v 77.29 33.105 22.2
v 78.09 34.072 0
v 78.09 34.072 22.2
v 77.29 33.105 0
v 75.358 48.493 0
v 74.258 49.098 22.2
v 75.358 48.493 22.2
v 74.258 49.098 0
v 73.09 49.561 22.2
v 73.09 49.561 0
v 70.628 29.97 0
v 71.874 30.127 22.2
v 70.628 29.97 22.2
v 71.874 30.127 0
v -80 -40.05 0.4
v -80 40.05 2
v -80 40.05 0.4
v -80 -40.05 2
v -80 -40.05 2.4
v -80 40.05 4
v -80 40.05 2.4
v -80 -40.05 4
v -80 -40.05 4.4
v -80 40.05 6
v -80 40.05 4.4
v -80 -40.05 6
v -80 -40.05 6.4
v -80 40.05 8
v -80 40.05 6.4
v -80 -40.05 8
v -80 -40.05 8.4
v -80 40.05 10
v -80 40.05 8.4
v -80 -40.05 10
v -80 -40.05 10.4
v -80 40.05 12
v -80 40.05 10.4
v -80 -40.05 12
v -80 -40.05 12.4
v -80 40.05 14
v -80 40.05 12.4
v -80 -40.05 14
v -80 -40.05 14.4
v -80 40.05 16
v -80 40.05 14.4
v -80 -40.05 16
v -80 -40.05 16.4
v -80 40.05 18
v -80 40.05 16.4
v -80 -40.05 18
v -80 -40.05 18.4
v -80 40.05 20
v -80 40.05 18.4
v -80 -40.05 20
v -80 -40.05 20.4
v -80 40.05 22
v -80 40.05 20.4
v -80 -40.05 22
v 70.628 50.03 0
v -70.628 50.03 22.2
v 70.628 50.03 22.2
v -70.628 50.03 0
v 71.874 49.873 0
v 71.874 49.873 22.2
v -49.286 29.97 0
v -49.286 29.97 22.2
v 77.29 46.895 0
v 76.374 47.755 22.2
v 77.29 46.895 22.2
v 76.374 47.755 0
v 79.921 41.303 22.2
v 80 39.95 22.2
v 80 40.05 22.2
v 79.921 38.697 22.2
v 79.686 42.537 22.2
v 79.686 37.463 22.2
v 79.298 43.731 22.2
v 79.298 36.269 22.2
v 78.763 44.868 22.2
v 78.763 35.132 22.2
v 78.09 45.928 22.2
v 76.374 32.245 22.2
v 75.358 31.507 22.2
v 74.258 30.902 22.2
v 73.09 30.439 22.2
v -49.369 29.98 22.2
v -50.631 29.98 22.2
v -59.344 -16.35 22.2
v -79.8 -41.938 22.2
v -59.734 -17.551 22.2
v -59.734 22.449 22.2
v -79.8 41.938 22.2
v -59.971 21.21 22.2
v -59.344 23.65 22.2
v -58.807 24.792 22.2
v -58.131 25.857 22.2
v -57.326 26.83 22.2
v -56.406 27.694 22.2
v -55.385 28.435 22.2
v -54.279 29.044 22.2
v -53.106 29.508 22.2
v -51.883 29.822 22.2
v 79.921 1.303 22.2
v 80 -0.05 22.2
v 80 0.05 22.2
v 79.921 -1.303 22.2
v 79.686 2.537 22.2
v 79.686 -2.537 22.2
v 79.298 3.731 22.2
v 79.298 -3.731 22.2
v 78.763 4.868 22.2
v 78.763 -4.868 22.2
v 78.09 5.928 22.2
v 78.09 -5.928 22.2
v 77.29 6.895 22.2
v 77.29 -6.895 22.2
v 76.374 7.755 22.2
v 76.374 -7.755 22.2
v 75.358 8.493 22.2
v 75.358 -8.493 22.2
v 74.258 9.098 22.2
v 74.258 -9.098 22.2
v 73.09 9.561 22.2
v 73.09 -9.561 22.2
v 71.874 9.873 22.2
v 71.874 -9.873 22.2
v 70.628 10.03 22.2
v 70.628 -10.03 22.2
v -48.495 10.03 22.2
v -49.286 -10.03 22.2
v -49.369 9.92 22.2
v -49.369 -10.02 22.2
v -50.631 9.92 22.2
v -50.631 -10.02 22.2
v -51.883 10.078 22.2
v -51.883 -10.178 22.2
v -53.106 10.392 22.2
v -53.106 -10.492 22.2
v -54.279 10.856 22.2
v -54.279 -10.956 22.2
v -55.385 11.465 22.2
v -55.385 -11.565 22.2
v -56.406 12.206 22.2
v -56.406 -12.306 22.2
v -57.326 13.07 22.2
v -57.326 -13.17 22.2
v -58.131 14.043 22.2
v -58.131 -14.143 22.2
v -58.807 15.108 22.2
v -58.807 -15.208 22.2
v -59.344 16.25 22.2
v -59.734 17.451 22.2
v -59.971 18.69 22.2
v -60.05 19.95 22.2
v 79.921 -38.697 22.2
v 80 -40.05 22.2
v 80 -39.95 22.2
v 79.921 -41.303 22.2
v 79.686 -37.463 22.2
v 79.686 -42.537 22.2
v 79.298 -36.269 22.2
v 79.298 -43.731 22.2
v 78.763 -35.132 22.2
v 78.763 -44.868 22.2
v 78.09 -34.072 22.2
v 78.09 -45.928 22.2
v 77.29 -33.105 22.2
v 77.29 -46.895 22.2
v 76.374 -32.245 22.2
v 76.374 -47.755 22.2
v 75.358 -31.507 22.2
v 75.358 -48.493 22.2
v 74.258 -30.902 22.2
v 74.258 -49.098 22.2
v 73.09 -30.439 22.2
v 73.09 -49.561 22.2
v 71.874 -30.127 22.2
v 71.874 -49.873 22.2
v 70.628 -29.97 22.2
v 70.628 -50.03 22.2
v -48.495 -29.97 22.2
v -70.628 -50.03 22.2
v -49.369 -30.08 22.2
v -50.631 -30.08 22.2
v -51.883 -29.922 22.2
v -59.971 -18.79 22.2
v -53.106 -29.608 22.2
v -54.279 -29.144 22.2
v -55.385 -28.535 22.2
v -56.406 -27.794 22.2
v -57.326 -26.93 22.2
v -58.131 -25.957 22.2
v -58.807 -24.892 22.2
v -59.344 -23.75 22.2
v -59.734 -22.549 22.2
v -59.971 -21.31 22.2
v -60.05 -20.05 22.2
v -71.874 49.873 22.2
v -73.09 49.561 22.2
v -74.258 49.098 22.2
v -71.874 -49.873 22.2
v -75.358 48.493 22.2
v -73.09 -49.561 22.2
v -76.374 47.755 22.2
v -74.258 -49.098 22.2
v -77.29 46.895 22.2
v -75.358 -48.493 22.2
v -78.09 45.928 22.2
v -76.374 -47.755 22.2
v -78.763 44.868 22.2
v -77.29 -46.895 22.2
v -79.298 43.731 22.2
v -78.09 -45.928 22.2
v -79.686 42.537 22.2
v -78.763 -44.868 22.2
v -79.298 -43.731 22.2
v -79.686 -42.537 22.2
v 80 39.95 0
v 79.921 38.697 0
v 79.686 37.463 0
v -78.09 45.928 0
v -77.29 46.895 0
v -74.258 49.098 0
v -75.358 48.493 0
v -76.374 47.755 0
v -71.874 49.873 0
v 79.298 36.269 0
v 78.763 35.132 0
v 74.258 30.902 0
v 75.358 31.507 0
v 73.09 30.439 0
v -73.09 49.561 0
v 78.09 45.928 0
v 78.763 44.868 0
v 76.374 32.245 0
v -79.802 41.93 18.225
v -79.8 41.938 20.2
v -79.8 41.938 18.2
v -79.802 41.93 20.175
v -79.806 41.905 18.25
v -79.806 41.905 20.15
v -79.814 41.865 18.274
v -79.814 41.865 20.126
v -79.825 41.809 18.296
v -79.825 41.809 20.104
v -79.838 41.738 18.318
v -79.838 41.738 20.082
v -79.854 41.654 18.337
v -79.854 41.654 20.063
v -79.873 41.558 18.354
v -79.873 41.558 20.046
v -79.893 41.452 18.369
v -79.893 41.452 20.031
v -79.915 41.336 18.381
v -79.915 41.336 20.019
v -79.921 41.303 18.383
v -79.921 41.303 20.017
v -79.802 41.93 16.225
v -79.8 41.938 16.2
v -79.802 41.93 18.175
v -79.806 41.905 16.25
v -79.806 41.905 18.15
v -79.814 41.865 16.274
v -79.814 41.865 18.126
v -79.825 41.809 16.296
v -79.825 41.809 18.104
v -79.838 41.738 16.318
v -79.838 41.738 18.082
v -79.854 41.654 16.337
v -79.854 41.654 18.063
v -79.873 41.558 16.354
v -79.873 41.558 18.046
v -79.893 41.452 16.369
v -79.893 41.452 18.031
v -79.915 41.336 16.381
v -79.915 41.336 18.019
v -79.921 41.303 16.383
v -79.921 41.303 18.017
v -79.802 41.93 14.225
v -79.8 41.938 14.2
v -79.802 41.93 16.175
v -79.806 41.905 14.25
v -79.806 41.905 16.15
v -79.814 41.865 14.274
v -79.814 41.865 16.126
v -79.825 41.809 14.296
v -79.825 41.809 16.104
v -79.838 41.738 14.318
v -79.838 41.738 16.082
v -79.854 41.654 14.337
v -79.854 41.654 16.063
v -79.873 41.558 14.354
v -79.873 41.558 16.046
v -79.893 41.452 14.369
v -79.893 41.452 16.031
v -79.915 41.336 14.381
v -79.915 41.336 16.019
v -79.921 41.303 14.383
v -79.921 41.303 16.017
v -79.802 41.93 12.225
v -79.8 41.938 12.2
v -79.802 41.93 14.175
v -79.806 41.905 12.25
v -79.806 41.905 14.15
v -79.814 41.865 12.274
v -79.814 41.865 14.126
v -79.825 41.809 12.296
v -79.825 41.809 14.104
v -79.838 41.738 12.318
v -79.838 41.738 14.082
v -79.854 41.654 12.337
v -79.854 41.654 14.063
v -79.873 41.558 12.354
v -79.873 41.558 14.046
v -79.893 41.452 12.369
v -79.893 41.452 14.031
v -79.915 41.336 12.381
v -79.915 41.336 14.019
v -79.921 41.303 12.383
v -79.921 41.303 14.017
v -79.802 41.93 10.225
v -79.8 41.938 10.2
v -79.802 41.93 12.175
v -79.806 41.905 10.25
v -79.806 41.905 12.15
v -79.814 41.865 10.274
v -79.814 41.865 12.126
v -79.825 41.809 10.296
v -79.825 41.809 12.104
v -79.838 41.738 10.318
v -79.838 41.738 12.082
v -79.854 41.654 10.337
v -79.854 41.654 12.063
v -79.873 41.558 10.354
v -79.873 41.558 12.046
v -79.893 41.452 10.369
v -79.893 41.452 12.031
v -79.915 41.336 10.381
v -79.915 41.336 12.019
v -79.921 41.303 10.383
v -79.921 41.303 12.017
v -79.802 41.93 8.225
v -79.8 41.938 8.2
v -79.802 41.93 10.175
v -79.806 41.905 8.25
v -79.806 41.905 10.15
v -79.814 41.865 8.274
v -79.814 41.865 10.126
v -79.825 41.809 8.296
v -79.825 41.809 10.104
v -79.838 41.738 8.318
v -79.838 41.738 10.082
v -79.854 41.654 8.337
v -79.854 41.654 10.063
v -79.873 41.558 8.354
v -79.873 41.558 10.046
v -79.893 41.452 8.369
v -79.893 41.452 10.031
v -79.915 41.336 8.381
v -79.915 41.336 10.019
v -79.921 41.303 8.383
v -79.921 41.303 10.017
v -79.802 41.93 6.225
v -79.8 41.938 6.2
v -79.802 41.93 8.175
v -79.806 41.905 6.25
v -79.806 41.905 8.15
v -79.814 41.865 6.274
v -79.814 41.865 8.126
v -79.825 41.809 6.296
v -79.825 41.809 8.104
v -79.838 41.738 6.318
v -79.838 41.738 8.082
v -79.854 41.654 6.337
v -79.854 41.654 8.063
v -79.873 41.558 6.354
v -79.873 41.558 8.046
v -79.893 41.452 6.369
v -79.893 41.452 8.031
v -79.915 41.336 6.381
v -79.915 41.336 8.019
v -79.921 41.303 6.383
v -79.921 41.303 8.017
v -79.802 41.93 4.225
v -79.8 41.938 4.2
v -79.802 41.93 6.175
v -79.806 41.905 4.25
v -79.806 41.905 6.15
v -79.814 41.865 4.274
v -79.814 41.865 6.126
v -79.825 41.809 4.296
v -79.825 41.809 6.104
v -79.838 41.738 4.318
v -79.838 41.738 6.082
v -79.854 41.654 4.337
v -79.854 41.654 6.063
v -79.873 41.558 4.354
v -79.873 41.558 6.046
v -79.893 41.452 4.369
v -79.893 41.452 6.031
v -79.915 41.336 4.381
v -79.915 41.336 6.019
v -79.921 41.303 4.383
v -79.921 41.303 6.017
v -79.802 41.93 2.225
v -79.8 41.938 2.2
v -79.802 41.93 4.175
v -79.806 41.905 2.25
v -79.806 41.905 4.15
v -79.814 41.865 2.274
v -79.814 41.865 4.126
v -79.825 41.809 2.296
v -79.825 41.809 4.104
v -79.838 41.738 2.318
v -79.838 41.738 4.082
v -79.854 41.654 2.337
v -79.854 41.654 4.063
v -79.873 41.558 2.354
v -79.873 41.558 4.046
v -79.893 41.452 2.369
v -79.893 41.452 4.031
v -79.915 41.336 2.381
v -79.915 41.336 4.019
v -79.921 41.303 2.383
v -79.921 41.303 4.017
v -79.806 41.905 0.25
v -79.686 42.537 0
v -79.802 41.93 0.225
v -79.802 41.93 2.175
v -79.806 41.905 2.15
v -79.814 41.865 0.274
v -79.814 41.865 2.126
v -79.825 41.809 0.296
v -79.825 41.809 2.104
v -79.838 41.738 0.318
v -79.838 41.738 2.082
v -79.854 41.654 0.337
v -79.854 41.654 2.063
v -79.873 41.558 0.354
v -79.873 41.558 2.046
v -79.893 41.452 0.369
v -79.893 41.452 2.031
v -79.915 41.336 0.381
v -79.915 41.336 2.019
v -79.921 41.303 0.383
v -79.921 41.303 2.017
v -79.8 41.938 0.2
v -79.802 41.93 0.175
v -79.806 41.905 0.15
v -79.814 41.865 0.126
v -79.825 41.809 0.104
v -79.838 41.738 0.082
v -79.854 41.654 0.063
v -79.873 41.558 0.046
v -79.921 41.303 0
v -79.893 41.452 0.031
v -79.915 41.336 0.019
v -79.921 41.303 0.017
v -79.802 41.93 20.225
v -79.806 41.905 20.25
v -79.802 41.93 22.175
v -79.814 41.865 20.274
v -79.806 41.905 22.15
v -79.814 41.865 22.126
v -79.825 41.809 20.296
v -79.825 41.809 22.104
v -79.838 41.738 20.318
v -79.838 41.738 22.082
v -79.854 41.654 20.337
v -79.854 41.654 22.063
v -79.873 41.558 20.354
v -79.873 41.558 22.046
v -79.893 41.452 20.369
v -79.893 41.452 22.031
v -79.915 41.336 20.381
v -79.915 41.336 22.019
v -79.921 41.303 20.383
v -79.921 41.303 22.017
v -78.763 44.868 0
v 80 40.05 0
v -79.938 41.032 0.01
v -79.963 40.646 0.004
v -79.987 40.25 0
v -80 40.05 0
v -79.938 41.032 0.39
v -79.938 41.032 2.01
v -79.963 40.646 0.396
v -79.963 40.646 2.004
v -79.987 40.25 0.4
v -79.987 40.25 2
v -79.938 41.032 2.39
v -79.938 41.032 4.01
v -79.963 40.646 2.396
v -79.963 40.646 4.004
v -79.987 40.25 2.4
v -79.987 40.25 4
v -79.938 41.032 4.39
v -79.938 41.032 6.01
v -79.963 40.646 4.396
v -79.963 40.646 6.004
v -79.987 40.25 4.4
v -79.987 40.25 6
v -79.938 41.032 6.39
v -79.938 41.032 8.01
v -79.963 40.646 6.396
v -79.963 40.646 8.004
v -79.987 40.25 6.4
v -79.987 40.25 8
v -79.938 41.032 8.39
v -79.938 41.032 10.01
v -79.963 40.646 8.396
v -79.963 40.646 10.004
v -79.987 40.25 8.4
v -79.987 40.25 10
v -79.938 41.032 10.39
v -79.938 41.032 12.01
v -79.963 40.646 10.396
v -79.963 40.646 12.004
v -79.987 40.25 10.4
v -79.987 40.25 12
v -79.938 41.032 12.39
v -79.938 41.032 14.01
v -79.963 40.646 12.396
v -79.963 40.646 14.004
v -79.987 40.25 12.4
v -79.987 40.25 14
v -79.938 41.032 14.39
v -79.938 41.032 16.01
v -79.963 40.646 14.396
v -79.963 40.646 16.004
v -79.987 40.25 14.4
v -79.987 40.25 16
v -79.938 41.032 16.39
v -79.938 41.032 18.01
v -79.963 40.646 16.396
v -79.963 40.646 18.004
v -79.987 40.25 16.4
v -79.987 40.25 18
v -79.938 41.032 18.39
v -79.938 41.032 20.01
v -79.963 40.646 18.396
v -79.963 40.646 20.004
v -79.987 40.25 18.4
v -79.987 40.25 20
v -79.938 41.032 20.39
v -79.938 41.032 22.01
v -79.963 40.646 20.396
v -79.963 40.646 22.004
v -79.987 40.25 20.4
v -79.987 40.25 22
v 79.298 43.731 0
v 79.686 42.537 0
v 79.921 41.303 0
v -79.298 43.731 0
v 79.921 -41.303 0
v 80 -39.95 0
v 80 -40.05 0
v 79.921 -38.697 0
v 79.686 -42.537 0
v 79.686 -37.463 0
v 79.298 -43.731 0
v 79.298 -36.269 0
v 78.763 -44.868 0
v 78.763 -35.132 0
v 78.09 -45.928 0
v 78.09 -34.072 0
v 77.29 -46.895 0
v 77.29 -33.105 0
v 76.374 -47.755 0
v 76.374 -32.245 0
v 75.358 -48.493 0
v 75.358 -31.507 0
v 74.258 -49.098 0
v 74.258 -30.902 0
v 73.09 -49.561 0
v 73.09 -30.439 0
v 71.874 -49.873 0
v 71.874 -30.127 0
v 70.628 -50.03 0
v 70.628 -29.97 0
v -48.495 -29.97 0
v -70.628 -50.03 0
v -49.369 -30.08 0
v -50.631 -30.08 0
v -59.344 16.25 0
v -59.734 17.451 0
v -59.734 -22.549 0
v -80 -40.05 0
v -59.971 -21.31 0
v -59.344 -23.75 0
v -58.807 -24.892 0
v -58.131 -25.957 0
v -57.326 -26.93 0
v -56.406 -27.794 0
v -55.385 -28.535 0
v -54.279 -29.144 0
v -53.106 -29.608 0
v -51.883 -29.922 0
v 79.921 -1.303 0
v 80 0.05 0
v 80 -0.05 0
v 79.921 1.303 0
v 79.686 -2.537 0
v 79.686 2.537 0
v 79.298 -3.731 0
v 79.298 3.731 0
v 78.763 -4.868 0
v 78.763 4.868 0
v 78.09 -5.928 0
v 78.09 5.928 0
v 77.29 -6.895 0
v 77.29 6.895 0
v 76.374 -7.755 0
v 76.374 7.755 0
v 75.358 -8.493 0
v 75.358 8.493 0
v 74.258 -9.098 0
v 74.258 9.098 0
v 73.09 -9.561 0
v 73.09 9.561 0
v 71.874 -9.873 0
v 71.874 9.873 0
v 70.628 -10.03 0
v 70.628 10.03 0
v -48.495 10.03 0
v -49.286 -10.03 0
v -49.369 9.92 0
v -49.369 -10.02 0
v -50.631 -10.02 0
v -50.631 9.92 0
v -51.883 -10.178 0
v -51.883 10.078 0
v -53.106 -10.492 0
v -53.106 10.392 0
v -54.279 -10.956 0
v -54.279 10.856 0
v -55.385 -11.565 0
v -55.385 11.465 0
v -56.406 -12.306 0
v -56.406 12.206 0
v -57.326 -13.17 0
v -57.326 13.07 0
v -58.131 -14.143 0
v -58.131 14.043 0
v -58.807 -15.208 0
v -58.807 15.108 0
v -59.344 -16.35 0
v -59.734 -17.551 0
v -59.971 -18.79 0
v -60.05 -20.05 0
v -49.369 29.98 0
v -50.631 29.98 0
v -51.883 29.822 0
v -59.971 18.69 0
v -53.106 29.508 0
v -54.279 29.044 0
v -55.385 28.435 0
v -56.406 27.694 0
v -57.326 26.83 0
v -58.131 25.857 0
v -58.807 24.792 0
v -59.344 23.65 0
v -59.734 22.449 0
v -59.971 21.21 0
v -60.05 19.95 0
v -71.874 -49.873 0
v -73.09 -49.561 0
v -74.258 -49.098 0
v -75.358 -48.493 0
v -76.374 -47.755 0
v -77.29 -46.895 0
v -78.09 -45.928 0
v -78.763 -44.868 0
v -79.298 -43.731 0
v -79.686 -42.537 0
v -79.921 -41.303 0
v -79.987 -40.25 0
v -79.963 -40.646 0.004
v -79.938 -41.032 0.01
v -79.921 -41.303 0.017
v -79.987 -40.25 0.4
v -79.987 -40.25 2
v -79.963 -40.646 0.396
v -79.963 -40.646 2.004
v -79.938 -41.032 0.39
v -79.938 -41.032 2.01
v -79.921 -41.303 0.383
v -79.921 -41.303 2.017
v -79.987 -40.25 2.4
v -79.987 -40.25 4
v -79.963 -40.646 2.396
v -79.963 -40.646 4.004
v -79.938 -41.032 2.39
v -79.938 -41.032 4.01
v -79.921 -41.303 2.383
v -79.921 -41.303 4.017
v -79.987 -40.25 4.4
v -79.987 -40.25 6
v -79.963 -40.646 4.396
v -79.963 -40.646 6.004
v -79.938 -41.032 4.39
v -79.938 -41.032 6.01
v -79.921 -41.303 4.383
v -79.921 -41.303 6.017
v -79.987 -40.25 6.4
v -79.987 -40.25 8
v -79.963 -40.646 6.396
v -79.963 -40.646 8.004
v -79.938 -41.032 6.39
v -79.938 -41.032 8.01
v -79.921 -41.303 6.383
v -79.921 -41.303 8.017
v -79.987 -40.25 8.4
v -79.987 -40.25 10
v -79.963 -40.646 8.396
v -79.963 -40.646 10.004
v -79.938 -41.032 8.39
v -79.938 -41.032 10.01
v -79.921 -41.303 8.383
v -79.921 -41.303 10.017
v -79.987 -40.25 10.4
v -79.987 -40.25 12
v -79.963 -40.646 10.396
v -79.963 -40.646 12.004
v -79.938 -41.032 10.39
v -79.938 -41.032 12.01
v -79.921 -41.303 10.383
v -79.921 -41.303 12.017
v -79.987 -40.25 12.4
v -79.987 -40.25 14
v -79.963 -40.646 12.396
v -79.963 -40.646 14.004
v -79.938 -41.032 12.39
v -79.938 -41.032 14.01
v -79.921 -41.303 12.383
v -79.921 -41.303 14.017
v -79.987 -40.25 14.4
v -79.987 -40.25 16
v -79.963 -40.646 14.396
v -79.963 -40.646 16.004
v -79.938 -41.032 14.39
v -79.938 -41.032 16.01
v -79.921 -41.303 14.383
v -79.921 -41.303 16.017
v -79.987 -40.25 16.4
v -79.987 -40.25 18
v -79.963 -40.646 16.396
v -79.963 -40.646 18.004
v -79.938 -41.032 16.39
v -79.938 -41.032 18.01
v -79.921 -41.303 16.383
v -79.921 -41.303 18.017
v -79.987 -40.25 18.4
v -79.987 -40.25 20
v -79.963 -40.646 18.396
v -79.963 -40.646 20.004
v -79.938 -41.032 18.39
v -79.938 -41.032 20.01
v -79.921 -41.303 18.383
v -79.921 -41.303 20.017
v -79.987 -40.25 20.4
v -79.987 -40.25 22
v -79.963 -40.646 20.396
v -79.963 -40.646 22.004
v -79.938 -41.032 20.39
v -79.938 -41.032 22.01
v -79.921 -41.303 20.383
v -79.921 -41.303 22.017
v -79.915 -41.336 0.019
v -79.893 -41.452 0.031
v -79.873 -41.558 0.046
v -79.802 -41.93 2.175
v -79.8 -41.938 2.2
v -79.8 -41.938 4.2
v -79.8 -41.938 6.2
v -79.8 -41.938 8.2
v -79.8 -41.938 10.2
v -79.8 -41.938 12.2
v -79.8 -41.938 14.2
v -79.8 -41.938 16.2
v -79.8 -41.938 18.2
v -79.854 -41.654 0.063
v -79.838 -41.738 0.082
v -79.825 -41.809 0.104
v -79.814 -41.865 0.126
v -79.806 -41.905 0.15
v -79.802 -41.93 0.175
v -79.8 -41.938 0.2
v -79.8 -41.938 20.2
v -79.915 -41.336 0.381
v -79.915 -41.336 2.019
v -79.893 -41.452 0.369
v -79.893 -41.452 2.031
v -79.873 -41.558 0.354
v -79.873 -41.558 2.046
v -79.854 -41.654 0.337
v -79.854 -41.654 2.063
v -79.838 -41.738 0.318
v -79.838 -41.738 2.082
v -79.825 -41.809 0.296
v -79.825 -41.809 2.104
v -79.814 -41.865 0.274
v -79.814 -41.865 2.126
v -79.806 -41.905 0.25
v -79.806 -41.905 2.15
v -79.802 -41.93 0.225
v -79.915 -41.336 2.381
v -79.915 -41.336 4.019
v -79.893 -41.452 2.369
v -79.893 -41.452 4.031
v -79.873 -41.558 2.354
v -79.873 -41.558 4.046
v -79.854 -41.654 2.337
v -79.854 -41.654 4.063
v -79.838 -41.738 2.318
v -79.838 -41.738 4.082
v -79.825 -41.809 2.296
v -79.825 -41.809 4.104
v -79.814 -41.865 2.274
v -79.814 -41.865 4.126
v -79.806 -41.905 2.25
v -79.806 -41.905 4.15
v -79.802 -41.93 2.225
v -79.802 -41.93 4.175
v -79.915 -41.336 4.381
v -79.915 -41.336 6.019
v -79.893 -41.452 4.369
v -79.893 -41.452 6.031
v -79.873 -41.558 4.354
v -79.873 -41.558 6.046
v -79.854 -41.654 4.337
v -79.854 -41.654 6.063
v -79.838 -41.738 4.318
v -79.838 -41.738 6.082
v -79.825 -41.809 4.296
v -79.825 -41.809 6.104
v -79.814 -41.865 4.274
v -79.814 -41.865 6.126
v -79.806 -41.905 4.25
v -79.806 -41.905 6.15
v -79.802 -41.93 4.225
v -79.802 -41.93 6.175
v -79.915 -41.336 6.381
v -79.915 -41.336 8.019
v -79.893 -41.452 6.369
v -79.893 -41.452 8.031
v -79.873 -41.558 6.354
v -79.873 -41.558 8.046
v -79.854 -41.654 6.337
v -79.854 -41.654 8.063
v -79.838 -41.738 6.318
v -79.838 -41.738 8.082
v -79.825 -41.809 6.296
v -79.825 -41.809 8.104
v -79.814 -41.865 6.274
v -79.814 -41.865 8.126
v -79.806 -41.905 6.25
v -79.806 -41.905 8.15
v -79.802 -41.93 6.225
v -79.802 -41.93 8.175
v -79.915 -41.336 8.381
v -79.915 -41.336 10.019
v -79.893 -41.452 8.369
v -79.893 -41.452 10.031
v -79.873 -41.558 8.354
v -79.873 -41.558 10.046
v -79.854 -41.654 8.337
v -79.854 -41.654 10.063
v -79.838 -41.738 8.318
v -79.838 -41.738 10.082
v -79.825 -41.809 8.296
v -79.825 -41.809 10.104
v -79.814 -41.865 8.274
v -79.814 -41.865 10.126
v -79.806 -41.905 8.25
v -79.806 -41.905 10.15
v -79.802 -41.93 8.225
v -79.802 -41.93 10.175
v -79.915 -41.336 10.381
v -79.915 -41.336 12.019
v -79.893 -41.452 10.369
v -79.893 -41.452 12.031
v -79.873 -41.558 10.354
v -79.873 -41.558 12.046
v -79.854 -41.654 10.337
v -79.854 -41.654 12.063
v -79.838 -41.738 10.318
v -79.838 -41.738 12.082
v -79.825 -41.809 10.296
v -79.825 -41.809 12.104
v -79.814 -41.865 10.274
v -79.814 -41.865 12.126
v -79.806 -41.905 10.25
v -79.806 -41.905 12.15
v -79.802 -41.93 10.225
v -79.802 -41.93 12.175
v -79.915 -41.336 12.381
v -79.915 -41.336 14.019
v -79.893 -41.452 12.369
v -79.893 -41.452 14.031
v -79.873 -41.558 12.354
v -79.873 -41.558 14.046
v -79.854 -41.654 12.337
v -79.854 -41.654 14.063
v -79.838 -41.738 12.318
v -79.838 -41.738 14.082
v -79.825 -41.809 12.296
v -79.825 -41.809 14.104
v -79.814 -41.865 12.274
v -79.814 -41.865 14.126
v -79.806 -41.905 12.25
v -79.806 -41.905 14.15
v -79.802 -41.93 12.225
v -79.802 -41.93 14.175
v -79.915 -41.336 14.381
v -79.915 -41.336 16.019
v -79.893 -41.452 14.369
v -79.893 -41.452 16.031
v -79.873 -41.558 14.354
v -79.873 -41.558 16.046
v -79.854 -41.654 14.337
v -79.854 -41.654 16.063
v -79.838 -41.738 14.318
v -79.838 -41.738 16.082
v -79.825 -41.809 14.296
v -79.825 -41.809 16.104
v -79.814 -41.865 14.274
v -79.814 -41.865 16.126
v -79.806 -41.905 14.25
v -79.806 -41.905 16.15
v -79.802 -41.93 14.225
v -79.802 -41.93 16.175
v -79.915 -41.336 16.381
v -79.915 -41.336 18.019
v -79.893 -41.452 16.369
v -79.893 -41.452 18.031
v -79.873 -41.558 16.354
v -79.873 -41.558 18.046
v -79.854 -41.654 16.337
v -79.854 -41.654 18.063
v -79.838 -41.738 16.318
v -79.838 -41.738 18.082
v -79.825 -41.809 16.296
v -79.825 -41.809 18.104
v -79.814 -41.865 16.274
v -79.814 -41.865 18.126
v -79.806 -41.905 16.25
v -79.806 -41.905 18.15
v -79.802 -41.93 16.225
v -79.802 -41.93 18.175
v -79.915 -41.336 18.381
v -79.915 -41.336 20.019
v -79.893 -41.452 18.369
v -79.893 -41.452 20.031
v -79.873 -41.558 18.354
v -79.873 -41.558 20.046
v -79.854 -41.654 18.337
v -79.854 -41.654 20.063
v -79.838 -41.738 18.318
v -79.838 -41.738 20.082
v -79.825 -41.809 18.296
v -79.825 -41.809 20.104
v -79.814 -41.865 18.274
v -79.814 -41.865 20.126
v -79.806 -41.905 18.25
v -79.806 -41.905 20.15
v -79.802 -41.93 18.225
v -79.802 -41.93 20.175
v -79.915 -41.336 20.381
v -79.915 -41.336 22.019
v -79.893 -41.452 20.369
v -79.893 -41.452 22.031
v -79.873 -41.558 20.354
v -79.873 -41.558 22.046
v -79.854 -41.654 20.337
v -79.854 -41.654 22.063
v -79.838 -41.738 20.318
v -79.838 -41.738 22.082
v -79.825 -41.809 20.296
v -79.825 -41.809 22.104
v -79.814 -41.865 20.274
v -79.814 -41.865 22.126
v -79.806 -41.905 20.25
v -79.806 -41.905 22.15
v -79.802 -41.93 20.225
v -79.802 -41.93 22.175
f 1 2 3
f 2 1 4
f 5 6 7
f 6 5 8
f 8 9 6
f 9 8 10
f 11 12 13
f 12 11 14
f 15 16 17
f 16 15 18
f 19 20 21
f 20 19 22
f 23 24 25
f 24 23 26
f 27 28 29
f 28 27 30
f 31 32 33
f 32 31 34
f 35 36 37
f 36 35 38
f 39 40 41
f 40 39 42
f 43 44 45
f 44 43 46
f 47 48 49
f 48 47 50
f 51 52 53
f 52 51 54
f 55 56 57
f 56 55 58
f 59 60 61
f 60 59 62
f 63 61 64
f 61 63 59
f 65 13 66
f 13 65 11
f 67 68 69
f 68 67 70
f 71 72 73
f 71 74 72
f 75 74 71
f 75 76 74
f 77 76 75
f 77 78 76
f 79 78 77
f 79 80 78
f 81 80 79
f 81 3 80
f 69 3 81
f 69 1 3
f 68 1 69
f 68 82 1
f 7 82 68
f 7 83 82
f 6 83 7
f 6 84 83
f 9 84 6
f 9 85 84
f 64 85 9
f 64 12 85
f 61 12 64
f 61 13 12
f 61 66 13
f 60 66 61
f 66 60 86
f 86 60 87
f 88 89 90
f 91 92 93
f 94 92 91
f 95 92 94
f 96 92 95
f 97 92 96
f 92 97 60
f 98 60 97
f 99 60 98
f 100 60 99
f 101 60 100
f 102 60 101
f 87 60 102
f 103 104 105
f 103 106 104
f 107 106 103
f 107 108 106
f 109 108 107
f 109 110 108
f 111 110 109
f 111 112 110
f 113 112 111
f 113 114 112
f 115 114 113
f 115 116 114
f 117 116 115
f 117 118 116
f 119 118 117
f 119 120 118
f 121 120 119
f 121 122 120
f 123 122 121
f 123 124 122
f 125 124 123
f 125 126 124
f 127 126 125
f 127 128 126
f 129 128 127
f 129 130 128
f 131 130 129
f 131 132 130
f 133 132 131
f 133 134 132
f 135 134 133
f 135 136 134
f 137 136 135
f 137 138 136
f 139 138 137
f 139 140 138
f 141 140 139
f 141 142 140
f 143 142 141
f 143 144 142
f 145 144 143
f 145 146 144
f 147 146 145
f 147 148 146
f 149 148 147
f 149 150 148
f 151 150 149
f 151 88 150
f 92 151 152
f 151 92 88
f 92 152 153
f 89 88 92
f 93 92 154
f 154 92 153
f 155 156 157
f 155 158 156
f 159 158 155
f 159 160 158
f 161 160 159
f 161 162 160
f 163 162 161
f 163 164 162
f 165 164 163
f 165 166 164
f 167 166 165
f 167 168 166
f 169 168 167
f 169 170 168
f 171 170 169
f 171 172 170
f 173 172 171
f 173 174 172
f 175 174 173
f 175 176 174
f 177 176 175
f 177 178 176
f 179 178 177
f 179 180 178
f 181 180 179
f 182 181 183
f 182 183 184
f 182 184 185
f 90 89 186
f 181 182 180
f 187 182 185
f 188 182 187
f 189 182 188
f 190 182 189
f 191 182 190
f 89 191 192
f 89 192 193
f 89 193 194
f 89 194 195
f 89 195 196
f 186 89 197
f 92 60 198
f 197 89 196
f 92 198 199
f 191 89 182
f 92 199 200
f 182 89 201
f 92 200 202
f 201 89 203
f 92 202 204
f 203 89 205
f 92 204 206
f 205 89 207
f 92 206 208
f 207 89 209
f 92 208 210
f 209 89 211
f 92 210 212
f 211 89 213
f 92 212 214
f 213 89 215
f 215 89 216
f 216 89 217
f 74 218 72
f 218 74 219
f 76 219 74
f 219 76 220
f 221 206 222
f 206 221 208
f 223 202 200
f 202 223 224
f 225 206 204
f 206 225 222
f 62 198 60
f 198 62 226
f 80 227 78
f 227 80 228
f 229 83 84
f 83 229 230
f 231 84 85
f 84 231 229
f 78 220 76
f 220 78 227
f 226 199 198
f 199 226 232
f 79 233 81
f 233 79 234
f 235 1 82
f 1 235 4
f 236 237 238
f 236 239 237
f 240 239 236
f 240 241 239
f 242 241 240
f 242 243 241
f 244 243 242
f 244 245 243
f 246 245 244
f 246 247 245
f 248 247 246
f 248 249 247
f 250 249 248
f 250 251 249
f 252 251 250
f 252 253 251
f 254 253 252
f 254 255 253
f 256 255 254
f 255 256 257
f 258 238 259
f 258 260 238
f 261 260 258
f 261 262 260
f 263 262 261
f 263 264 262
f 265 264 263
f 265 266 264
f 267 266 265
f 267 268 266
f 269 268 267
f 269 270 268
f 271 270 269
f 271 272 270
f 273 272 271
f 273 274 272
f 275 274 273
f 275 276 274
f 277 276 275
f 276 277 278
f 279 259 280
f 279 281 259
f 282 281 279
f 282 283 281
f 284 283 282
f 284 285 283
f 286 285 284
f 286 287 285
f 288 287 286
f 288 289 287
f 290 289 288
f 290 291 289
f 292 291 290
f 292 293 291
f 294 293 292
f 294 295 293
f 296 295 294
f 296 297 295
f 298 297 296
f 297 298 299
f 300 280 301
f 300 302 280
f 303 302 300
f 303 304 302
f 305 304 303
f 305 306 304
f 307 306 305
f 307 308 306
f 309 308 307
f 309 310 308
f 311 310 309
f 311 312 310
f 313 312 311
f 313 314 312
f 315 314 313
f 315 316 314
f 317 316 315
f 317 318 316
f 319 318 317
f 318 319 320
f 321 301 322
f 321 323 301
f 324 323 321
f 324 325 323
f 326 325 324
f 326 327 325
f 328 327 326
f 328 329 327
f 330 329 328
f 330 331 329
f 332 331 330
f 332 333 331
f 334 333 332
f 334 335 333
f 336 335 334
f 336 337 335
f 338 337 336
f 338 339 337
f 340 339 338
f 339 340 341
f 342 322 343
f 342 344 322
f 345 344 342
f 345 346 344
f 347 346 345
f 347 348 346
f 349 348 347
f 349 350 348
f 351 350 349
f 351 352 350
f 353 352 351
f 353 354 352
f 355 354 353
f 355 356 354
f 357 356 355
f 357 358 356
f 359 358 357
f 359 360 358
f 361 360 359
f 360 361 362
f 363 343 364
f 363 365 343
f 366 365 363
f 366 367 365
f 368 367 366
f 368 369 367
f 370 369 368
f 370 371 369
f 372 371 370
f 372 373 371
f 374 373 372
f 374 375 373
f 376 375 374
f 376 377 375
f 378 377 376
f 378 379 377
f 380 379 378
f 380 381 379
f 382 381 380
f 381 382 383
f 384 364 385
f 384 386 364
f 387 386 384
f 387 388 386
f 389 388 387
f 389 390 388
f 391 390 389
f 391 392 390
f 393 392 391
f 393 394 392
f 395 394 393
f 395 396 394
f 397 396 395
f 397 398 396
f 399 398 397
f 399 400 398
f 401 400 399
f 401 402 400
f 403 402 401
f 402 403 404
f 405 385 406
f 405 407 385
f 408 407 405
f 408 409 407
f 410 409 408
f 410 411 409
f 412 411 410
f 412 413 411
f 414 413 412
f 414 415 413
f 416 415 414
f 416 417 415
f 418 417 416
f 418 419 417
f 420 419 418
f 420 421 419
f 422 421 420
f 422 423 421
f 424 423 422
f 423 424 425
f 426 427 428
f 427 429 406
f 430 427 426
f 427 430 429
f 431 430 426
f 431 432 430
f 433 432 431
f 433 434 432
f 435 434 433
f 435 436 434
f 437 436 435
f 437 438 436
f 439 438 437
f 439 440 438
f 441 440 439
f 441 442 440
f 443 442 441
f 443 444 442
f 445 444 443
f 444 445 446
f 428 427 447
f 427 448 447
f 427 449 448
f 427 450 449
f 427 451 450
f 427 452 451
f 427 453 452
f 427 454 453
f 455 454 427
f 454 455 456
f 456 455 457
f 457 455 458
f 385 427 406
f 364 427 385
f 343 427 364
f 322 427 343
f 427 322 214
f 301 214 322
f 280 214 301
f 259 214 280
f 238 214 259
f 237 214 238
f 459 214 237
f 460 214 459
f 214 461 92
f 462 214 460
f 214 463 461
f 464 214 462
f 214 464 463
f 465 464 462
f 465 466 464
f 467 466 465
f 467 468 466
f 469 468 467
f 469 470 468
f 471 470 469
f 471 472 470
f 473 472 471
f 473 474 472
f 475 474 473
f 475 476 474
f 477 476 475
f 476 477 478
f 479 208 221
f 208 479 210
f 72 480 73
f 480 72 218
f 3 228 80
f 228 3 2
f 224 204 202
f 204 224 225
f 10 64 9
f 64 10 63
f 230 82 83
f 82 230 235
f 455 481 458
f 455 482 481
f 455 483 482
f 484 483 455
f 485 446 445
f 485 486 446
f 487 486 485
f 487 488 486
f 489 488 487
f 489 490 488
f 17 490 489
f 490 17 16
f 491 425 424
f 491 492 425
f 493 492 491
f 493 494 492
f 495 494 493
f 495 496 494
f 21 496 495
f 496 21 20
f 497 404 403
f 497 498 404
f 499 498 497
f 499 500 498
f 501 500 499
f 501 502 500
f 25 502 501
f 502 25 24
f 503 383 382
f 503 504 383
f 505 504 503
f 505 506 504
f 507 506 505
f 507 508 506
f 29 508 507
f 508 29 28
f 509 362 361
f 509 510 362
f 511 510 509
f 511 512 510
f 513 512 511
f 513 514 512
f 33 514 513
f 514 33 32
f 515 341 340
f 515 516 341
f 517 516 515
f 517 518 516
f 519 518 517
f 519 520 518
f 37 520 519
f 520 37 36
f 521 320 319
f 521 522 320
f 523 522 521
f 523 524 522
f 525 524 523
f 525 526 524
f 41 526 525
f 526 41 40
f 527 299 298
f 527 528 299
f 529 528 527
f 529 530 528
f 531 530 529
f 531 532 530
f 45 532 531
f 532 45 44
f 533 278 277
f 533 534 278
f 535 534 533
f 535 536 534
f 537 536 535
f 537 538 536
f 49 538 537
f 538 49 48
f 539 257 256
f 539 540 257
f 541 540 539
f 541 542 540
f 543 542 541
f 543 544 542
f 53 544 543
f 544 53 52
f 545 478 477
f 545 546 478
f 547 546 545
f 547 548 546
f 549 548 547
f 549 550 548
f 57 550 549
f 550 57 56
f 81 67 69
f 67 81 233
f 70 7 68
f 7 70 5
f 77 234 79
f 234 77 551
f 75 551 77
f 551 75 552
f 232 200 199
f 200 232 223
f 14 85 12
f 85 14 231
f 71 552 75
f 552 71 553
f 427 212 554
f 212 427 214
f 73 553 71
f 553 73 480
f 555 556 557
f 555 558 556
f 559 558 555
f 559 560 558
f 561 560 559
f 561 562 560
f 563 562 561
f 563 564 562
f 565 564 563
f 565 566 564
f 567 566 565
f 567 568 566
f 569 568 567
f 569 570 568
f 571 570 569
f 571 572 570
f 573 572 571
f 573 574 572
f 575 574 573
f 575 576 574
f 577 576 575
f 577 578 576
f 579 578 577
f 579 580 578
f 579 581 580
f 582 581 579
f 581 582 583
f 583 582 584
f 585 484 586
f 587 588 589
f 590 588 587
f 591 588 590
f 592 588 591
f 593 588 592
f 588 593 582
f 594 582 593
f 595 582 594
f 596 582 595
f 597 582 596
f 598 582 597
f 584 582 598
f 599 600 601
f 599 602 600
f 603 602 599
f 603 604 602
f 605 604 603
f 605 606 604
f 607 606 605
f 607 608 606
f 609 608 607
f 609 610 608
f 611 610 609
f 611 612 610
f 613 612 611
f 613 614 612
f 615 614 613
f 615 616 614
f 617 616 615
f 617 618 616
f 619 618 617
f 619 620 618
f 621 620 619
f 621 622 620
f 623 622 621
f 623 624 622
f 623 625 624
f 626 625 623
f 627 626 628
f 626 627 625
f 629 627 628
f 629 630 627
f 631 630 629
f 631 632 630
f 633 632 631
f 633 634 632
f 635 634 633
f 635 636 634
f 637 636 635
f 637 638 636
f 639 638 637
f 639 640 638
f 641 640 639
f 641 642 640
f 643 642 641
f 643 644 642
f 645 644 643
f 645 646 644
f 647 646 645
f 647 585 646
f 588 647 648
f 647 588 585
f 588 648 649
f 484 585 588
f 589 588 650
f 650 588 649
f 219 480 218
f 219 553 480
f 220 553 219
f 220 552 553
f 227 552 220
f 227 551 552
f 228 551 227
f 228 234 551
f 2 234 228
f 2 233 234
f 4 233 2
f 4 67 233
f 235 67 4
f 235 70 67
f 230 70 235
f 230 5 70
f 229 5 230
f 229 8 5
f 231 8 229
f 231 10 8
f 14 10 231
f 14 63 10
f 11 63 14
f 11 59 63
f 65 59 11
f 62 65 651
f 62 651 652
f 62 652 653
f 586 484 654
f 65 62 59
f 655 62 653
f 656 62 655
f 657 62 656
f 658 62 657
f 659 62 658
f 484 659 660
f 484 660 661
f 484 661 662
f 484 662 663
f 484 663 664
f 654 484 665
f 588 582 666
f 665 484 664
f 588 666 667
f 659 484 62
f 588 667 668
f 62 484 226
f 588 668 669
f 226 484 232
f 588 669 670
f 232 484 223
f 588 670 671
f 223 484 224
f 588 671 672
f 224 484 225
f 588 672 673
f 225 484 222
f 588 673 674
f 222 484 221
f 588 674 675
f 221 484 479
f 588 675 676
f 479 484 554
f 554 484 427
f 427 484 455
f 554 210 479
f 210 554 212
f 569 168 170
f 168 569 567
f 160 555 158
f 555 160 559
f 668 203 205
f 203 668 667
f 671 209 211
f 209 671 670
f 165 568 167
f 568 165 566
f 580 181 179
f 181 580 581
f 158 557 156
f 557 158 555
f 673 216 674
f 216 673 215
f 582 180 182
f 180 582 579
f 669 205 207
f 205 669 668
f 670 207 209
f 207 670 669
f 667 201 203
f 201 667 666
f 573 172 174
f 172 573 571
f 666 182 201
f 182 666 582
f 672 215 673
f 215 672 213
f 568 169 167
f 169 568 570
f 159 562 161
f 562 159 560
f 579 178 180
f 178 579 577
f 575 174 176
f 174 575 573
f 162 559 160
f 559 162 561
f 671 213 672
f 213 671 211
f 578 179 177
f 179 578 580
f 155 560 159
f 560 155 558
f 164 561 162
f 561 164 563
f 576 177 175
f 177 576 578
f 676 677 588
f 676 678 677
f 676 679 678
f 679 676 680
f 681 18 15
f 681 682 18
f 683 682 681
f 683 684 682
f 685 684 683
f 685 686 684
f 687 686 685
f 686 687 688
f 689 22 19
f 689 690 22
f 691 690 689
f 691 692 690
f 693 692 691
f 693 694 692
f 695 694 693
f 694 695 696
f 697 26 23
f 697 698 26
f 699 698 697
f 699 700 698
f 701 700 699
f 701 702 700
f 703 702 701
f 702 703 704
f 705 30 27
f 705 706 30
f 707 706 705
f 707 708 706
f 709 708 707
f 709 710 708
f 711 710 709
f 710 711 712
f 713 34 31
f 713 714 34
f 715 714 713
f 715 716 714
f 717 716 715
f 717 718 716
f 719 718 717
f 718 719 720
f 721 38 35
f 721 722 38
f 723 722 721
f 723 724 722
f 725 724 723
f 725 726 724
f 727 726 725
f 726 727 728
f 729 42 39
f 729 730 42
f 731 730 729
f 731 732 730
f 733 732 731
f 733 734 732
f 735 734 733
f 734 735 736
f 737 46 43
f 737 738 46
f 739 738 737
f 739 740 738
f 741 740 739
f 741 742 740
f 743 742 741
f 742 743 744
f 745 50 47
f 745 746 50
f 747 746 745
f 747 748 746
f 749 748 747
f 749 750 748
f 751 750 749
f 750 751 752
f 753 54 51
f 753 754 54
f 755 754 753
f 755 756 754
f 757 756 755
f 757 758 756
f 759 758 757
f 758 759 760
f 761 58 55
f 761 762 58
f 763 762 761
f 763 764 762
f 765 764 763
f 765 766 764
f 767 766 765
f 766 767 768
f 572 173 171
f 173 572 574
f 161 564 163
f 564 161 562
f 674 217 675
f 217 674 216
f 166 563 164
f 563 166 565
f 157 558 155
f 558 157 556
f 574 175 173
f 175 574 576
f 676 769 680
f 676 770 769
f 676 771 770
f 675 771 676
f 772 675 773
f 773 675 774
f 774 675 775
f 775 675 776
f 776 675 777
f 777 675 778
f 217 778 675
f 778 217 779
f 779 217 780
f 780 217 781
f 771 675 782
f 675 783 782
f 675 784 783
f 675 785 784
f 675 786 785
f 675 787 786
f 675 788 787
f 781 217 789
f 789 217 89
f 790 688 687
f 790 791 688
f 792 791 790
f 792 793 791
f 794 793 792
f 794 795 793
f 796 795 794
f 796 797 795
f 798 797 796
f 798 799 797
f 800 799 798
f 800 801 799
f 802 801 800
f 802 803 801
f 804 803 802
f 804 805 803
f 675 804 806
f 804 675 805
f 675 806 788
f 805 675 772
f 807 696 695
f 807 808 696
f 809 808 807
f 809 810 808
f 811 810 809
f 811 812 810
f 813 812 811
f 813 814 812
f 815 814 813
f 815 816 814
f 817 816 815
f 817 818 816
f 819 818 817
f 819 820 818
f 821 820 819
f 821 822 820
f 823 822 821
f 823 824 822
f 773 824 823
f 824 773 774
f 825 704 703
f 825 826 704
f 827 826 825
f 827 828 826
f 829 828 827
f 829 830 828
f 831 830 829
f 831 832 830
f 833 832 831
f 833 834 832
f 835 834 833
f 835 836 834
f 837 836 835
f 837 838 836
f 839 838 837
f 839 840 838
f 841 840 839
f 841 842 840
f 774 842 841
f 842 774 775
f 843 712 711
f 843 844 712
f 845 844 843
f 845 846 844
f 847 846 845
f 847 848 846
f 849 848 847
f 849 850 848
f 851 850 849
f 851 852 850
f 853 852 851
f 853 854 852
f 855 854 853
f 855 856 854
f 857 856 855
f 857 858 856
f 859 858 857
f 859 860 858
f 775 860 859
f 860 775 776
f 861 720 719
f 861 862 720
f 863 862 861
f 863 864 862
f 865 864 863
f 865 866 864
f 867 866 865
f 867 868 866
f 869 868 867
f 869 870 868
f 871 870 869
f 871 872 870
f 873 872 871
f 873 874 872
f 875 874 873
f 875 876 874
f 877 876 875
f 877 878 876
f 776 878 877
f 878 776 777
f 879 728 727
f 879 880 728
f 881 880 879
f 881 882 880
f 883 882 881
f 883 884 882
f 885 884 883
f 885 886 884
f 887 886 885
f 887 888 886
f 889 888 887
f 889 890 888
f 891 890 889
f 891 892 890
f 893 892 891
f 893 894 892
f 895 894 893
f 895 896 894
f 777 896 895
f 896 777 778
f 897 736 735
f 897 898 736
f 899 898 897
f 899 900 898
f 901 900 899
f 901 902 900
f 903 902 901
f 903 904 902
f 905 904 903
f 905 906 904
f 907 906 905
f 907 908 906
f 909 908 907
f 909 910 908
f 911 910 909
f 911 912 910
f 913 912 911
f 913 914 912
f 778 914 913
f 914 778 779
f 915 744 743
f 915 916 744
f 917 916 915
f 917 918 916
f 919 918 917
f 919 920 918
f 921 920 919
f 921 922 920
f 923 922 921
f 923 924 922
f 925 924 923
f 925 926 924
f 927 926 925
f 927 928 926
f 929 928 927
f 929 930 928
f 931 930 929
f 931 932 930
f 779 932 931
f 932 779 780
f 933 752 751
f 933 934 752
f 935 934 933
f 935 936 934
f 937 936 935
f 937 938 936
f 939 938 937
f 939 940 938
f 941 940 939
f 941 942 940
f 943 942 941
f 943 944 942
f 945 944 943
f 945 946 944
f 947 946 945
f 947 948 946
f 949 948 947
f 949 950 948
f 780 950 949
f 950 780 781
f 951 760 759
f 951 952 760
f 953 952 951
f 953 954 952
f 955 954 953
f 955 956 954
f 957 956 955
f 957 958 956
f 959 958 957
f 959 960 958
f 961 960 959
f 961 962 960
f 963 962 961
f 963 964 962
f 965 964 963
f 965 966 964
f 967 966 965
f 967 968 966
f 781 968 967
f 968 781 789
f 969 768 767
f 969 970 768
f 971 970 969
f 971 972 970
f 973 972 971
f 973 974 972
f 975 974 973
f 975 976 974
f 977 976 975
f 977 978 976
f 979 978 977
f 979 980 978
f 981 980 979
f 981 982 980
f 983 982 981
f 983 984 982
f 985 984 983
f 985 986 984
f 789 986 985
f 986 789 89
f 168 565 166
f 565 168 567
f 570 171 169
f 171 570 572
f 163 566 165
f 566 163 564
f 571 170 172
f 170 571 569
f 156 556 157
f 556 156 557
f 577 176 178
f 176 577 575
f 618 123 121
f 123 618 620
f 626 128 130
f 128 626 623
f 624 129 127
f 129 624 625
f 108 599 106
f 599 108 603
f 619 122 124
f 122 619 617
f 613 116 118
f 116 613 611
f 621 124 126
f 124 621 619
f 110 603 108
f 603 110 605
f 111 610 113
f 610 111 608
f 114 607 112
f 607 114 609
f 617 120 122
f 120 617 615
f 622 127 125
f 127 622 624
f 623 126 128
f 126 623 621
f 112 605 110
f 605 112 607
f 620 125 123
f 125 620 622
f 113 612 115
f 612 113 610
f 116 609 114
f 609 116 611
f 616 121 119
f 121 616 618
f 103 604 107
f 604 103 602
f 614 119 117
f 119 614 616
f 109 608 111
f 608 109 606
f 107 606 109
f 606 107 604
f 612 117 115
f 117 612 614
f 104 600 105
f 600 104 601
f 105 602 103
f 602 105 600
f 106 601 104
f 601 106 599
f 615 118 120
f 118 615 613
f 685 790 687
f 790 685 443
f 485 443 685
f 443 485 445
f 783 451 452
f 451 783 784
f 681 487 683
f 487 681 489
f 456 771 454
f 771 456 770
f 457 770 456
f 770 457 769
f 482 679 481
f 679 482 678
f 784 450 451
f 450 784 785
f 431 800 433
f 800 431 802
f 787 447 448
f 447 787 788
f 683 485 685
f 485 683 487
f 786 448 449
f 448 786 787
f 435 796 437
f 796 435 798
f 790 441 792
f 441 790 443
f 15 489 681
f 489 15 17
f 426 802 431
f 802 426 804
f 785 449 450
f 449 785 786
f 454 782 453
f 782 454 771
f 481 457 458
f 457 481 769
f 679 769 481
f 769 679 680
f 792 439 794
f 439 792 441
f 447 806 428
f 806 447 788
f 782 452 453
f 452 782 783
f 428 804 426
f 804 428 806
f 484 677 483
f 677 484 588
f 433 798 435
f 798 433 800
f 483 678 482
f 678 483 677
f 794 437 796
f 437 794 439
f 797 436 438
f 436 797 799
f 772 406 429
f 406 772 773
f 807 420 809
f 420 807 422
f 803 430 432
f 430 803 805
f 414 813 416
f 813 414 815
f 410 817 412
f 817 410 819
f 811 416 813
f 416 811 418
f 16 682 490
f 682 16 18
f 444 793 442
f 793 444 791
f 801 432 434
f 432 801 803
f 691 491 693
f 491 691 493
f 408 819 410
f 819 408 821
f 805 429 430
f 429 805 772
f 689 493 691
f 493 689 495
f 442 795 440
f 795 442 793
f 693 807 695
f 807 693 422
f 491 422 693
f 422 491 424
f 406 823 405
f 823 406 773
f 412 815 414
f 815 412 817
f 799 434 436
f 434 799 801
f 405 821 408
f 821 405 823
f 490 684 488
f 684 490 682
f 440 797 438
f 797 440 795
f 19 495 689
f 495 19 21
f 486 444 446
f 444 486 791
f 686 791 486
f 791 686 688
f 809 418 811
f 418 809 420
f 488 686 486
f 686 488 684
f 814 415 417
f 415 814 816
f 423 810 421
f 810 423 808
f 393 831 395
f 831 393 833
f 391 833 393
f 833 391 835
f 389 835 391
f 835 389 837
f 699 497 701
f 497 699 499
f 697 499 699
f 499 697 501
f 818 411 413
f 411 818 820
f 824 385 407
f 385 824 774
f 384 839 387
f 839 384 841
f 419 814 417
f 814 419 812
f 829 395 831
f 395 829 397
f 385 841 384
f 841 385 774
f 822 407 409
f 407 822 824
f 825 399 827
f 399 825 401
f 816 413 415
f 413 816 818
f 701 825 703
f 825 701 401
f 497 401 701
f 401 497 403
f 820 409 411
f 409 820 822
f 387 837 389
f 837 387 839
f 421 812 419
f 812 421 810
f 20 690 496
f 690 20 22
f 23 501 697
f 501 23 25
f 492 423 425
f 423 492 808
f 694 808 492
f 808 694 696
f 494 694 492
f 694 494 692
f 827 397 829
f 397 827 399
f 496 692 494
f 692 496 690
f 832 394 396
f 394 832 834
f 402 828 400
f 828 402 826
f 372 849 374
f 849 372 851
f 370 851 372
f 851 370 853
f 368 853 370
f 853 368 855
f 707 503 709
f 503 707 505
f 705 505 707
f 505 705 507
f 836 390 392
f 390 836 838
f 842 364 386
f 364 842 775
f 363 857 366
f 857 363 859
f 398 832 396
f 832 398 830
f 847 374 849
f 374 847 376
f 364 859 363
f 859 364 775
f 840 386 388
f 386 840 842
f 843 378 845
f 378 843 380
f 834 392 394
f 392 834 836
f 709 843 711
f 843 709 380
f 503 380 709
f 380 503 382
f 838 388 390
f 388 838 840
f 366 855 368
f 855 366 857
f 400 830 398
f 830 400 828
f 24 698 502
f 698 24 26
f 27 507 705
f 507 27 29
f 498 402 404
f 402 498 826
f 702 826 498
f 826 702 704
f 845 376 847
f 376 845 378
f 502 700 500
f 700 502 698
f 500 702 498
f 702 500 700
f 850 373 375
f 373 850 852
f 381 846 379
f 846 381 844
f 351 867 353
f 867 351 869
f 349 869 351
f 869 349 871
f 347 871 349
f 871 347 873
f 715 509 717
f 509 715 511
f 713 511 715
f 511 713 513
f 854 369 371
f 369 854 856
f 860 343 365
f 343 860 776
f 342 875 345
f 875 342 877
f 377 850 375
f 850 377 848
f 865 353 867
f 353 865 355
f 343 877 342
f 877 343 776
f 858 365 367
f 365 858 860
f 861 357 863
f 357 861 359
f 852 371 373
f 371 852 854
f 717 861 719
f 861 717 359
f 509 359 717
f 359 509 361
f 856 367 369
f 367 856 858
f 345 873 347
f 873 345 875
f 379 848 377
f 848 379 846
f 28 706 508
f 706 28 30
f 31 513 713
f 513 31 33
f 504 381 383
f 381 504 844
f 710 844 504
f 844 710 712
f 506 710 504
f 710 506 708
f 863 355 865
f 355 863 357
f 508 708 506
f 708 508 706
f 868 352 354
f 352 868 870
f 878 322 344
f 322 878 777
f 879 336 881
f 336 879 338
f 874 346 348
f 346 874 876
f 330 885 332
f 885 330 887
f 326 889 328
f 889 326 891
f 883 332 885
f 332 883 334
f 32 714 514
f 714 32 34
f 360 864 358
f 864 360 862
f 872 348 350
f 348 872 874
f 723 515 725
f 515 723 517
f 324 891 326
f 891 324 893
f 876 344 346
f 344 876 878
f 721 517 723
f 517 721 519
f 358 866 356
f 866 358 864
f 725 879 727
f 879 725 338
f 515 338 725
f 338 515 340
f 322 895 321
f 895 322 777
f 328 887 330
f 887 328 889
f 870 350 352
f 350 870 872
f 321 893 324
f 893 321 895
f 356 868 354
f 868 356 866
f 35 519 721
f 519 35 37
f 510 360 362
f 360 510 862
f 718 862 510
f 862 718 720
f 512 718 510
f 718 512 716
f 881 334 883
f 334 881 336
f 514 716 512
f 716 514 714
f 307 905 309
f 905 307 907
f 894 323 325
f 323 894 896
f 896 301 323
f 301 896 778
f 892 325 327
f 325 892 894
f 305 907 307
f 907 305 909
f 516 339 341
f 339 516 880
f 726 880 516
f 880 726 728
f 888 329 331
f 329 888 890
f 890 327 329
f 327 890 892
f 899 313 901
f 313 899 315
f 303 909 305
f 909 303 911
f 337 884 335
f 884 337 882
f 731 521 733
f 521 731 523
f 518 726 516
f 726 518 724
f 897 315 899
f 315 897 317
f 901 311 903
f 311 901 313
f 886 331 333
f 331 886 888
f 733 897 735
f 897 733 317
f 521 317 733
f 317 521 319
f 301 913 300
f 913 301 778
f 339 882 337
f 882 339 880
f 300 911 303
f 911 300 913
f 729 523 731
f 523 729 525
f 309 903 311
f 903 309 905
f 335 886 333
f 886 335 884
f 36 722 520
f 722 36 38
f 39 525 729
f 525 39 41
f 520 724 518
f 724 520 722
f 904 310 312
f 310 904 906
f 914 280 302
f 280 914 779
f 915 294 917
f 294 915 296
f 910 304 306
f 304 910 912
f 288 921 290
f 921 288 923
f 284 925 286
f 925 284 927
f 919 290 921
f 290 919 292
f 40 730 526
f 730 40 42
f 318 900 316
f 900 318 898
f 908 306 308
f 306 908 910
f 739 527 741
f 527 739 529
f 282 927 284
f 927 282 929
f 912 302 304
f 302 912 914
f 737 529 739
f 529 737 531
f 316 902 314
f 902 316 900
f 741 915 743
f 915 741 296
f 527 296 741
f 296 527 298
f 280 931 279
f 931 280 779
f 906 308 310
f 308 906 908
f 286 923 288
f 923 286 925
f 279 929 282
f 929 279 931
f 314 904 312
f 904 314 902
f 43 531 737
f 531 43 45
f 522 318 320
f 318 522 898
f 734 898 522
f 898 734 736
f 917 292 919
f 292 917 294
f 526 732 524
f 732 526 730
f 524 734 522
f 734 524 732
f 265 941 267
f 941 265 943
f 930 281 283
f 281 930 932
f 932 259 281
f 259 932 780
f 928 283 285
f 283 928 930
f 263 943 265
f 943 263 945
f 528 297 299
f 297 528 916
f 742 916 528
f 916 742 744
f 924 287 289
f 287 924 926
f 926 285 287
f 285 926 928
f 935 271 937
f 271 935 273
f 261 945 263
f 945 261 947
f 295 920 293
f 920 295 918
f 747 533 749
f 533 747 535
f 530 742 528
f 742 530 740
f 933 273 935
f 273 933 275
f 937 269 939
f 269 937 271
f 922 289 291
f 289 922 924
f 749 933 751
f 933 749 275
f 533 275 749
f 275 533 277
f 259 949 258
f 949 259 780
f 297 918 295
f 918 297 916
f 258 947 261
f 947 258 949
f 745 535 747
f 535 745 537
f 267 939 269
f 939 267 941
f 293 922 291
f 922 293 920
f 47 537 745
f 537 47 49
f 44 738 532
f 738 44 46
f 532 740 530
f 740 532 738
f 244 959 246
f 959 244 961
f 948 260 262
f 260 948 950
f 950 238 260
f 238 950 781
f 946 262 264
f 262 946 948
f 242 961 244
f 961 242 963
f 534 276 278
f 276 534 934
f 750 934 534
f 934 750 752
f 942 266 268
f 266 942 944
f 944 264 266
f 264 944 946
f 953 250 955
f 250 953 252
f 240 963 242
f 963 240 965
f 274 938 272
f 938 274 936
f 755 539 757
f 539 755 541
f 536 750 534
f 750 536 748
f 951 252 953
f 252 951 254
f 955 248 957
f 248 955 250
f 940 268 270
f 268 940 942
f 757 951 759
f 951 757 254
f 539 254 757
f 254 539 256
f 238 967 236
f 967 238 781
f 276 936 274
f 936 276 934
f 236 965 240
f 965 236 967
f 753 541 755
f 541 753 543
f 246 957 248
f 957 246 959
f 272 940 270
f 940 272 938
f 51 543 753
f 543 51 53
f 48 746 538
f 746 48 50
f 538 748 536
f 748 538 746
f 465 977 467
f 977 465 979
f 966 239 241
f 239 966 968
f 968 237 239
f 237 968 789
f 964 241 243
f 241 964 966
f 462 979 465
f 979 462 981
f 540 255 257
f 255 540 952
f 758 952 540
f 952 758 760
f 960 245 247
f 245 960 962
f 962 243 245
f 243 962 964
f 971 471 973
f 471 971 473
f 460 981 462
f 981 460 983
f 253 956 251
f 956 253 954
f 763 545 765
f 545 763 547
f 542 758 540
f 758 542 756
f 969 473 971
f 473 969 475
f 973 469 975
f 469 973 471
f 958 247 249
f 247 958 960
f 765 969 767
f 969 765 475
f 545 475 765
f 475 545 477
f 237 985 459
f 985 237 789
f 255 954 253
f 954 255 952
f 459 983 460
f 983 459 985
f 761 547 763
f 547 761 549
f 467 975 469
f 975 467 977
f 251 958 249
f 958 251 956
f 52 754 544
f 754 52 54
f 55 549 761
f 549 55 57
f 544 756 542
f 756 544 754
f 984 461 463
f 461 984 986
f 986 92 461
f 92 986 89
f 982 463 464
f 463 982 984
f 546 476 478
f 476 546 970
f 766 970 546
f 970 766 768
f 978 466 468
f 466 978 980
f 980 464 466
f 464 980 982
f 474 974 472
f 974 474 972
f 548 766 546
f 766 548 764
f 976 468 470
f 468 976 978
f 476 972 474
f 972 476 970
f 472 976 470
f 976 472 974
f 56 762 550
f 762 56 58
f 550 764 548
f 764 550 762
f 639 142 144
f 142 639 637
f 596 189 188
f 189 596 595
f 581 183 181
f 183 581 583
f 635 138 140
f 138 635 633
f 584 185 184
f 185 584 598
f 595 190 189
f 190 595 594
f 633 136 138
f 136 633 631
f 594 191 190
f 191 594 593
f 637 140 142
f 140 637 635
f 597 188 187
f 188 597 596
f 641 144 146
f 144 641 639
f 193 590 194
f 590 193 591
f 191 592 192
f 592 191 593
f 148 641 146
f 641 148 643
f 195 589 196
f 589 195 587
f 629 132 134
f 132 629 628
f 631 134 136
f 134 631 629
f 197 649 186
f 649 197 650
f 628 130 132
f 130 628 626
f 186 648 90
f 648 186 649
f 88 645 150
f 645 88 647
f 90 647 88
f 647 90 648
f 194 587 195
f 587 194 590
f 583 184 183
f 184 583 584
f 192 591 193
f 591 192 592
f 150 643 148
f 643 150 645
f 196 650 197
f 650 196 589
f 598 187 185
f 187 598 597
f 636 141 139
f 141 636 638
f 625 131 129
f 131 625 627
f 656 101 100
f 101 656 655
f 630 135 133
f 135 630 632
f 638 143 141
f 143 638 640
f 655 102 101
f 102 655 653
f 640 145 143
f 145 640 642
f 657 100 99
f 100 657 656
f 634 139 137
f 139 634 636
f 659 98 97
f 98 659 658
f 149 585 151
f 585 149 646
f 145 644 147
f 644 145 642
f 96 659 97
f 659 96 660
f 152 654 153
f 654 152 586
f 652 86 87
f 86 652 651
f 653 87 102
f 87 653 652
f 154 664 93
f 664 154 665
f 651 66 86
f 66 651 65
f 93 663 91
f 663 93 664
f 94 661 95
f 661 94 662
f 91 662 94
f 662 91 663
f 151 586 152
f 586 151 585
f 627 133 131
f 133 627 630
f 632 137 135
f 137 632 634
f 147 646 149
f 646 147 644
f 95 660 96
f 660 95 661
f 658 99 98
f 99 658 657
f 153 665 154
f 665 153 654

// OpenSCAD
//-------------------------------------------------------------------------------------------
// Max Flow Test
// Original Design : Cnc Kitchen
//                   https://www.printables.com/fr/model/342075-extrusion-test-structure
// Freely adapted by 5@xes  2023
//---------------------------
//     MaxFlow Script
//---------------------------
// Nozzle               : 0.4
// Layer                : 0.25
// Start Value          : 50 %
// Value Increment      : 10 %
// Change Layer         : 8 
// Offset Layer         : 0
//-------------------------------------------------------------------------------------------
// Modification : None
//-------------------------------------------------------------------------------------------

$fn=50;
font = "Arial:style=Bold";

Hc=0.2; // Layer Height
Line_Width = 0.4; // line Width

Height = 110*Hc-1;
letter_size = 0.30*Height;
letter_height = Line_Width;

Base();


module Base() {
  translate([-70, -40.05, 0]) difference() {  
    minkowski() {
        union() {
            translate([0, 0, 0]) cube([10,80,Height+Hc], center = false);
            translate([0, 0, 0]) cube([140,0.1,Height+Hc], center = false);
            translate([0, 40, 0]) cube([140,0.1,Height+Hc], center = false);
            translate([0, 80, 0]) cube([140,0.1,Height+Hc], center = false);
        }
      cylinder(r=10,h=1, center = false);
    }
    translate([20, 20, 0]) cylinder(h = Height*2, r1 = 10.05, r2 = 10.05, center = false);
    translate([20, 60, 0]) cylinder(h = Height*2, r1 = 10.05, r2 = 10.05, center = false);
    
    for (a =[0:2:30])
        translate([-10, -10, a+Hc]) rotate([-90,0,0]) cylinder(h = 150, r1 = 0.2, r2 = 0.2, center = false);
  }
}

module letter(Txt) {
  color("Yellow")
  linear_extrude(height = letter_height) {
    text(Txt, size = letter_size, font = font, halign = "center", valign = "center");
  }
}
